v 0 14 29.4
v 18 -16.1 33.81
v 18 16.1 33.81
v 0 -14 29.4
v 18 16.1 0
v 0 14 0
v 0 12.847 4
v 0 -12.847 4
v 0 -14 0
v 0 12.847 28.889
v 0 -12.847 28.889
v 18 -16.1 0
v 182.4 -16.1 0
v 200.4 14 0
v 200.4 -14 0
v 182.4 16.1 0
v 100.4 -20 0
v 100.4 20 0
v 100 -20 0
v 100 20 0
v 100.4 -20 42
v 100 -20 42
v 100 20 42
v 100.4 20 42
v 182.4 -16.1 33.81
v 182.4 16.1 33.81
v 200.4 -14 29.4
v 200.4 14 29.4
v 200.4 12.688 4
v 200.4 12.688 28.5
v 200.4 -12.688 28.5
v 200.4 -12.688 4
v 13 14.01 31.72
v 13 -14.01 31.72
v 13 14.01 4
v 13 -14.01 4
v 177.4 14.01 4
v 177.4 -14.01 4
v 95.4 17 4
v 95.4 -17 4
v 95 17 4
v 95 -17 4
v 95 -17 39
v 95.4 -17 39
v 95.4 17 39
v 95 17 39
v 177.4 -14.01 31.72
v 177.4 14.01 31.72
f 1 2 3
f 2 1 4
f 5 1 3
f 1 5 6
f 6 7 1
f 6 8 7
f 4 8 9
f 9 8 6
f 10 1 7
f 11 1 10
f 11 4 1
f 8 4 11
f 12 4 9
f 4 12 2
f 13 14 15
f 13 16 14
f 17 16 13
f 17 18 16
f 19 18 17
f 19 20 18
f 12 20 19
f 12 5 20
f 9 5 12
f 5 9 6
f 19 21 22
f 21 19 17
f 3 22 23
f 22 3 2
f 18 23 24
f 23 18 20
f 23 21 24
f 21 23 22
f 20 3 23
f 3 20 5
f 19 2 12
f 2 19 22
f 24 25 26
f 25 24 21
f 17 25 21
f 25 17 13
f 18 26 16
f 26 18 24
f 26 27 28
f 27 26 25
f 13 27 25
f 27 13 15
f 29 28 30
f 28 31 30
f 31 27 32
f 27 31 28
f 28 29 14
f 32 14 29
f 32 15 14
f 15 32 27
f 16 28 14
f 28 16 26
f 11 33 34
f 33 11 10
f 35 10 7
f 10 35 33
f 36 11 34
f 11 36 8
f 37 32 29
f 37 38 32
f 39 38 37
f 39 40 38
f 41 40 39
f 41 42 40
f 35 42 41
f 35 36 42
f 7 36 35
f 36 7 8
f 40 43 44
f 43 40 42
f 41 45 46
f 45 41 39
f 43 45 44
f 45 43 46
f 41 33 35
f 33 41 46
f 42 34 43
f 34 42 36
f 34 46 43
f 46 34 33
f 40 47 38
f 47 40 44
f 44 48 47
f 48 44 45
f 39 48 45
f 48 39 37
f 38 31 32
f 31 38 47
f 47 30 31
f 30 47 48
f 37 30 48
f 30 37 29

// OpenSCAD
$fn = 32;

// ----------------------------------------------------------------------
// Faired channel: 200 x 40 x 42 mm, 3 mm walls, faired ends
// ----------------------------------------------------------------------

// --- parameters (mm) ---
length = 200;             // channel length
width = 40;               // channel width at mid length
height = 42;              // channel height at mid length
wall = 3;                 // side wall thickness
floor_t = 4;              // floor thickness
end_w = 28;               // faired end width
end_h = 29.4;             // faired end height

difference() {
  union() {
    hull() {
      translate([0, -14, 0]) cube([0.4, 28, 29.4]);
      translate([18, -16.1, 0]) cube([0.4, 32.2, 33.81]);
    }
    hull() {
      translate([18, -16.1, 0]) cube([0.4, 32.2, 33.81]);
      translate([100, -20, 0]) cube([0.4, 40, 42]);
    }
    hull() {
      translate([100, -20, 0]) cube([0.4, 40, 42]);
      translate([182, -16.1, 0]) cube([0.4, 32.2, 33.81]);
    }
    hull() {
      translate([182, -16.1, 0]) cube([0.4, 32.2, 33.81]);
      translate([200, -14, 0]) cube([0.4, 28, 29.4]);
    }
  }
  /* cavity, 5 mm proud of both ends so the ports are cut clean */
  hull() {
    translate([-5, -12.4, 4]) cube([0.4, 24.8, 23.8]);
    translate([13, -14.01, 4]) cube([0.4, 28.02, 27.72]);
  }
  hull() {
    translate([13, -14.01, 4]) cube([0.4, 28.02, 27.72]);
    translate([95, -17, 4]) cube([0.4, 34, 35]);
  }
  hull() {
    translate([95, -17, 4]) cube([0.4, 34, 35]);
    translate([177, -14.01, 4]) cube([0.4, 28.02, 27.72]);
  }
  hull() {
    translate([177, -14.01, 4]) cube([0.4, 28.02, 27.72]);
    translate([205, -12.4, 4]) cube([0.4, 24.8, 23.8]);
  }
}
